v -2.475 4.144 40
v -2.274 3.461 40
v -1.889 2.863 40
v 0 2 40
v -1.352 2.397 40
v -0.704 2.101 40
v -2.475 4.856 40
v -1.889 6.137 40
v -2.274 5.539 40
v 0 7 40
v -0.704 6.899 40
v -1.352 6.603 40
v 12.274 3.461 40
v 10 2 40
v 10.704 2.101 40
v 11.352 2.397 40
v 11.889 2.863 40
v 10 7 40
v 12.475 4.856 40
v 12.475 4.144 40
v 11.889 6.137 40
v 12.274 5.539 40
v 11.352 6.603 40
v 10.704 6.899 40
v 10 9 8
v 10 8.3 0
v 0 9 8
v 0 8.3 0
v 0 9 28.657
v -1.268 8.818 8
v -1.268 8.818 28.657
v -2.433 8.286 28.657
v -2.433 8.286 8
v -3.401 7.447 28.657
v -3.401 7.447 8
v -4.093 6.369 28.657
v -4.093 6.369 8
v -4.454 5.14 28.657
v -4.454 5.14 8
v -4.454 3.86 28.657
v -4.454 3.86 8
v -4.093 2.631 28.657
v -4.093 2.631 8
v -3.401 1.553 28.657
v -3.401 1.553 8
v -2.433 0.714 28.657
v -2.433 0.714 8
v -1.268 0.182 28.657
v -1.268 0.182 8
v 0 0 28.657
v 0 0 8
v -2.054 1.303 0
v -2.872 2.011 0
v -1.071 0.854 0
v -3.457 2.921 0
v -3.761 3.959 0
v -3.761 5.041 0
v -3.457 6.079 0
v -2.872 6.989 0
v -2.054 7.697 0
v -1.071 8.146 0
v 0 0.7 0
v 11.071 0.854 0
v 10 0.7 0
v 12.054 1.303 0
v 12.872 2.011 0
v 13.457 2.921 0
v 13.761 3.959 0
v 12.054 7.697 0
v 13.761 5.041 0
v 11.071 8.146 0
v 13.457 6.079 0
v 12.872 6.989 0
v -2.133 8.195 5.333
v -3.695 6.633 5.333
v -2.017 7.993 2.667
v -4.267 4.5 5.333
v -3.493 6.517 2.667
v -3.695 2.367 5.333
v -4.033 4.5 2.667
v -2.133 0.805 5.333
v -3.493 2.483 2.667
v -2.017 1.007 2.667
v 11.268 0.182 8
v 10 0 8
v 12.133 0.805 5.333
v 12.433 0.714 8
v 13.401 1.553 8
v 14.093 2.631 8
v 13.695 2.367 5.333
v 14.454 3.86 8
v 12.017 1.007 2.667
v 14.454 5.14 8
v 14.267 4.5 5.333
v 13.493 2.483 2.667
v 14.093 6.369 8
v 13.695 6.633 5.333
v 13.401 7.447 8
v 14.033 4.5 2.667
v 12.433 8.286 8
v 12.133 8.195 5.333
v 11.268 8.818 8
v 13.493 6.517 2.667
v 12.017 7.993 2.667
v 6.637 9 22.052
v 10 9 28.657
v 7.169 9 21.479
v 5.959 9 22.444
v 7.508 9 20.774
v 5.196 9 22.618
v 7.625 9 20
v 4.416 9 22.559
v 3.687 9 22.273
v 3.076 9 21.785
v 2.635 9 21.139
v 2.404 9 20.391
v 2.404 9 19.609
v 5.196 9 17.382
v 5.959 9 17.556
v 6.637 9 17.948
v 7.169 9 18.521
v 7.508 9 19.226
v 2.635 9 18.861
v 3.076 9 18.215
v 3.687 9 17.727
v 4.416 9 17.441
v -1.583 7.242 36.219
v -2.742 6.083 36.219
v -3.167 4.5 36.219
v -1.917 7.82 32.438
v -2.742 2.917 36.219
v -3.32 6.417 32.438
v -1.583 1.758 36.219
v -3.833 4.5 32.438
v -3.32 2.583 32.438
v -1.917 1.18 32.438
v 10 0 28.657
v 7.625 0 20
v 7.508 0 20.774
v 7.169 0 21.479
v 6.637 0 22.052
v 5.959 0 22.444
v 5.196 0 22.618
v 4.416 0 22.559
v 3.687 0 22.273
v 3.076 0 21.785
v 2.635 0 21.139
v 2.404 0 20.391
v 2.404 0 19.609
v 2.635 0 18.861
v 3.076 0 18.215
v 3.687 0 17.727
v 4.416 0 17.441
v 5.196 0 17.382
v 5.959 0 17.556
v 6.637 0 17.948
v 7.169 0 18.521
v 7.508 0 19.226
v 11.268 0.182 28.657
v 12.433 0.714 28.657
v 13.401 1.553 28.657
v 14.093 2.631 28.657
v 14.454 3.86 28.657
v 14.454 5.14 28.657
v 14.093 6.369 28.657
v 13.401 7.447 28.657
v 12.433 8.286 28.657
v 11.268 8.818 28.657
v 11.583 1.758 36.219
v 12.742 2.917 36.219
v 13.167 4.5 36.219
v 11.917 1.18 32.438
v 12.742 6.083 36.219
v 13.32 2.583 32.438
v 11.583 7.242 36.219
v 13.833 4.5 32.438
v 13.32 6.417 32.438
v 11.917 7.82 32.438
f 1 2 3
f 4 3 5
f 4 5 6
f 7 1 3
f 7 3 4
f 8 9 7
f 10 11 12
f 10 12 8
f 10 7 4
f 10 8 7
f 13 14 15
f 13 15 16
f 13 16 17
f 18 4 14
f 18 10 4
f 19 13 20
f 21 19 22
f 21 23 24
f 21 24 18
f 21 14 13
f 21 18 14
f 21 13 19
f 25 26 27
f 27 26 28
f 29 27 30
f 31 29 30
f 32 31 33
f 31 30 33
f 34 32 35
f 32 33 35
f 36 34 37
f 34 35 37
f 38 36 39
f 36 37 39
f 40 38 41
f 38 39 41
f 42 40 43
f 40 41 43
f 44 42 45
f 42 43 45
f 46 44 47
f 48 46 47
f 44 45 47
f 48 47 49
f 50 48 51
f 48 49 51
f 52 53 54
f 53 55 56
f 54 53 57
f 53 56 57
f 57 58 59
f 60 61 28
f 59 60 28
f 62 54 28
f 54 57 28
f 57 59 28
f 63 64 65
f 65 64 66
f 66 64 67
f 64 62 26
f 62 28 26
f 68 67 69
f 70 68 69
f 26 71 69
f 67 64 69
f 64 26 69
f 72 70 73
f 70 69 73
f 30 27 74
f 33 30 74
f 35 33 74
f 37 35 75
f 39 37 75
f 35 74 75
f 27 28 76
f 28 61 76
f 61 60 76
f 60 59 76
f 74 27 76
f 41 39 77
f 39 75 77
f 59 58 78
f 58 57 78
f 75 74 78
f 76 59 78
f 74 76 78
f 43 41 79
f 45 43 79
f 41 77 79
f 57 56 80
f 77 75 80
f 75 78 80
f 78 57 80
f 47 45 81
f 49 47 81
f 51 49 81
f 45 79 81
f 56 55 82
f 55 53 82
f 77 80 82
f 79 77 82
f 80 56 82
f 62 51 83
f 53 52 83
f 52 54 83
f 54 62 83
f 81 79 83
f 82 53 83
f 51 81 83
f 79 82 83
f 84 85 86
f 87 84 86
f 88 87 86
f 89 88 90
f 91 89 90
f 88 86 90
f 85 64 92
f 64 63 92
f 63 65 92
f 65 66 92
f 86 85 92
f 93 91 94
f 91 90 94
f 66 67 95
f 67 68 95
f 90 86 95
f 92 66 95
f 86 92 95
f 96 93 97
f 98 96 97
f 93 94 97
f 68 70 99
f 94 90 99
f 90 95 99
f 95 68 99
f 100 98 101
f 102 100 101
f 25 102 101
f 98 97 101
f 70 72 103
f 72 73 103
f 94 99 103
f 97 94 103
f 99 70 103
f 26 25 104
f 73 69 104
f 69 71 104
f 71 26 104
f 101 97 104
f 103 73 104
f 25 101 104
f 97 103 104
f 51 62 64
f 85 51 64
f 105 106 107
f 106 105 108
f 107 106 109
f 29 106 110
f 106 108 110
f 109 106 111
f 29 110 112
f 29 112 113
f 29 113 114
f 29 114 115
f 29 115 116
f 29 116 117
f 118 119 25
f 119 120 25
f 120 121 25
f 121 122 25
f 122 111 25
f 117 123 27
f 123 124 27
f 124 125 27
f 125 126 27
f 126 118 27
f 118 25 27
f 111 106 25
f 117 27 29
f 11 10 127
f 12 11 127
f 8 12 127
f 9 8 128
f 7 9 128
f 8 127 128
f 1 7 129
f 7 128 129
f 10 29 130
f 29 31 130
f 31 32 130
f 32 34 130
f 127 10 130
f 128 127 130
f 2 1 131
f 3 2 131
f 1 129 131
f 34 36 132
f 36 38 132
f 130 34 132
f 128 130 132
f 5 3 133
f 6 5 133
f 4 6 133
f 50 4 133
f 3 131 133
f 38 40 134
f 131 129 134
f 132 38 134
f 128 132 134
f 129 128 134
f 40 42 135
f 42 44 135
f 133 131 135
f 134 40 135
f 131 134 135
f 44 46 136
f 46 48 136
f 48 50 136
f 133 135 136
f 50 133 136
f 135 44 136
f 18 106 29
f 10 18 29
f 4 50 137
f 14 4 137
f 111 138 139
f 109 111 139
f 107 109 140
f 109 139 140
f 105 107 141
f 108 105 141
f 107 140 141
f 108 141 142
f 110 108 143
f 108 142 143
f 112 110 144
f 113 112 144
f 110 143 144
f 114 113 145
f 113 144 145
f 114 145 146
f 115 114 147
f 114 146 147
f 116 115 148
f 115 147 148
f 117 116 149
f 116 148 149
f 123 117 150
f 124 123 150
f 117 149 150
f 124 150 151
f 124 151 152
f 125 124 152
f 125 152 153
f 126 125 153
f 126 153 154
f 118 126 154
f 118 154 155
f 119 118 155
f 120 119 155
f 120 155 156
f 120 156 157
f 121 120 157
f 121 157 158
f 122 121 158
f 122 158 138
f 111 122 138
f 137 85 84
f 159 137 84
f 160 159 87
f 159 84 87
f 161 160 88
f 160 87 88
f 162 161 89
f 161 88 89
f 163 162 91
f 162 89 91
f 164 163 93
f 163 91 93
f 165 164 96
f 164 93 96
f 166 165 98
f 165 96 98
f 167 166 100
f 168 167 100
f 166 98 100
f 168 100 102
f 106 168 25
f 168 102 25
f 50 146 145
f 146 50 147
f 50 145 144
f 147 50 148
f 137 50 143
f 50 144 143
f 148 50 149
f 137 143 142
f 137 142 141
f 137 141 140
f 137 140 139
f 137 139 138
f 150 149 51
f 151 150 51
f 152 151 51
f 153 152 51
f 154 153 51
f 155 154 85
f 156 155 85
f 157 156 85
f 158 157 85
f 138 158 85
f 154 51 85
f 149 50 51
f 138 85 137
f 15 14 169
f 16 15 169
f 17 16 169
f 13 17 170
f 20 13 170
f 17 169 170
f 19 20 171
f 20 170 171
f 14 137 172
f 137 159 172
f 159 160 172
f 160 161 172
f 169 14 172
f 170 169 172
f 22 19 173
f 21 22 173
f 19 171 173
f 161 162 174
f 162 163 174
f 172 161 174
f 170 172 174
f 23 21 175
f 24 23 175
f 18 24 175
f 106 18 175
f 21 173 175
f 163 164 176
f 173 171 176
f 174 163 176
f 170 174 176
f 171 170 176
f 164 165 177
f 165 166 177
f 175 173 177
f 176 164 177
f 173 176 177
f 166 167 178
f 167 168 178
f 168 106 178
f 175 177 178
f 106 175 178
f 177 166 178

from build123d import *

# Parameters (mm, degrees)
F1_DEPTH = 40
F2_R     = 2.625
F3_DEPTH = 25
F4_SIZE2 = 0.6999093082
F4_SIZE  = 8
F5_SIZE2 = 11.3425636392
F5_SIZE  = 2


with BuildPart() as f1:
    # F0 (on Top) → F1 (new body)
    with BuildSketch(Plane.XY):
        with BuildLine():
            ThreePointArc((0, 9), (-4.5, 4.5), (0, 0))
            Line((0, 0), (10, 0))
            ThreePointArc((10, 0), (14.5, 4.5), (10, 9))
            Line((10, 9), (0, 9))
        make_face()
    extrude(amount=F1_DEPTH)

    # F2 (on face) → F3 (cut)
    with BuildSketch(Plane.XZ):
        with Locations((5, 20)):
            Circle(F2_R)
    extrude(amount=-F3_DEPTH, mode=Mode.SUBTRACT)

    # F4
    f4_edges = [f1.edges().sort_by_distance(p)[0] for p in [
        (5, 0, 0),
        (14.5, 4.5, 0),
        (5, 9, 0),
        (-4.5, 4.5, 0),
    ]]
    chamfer(f4_edges, length=F4_SIZE, length2=F4_SIZE2)

    # F5
    f5_edges = [f1.edges().sort_by_distance(p)[0] for p in [
        (5, 0, 40),
        (14.5, 4.5, 40),
        (5, 9, 40),
        (-4.5, 4.5, 40),
    ]]
    f5_side = f1.faces().sort_by_distance((5, 4.5, 40))[0]
    chamfer(f5_edges, length=F5_SIZE, length2=F5_SIZE2, reference=f5_side)


solid = f1.part
